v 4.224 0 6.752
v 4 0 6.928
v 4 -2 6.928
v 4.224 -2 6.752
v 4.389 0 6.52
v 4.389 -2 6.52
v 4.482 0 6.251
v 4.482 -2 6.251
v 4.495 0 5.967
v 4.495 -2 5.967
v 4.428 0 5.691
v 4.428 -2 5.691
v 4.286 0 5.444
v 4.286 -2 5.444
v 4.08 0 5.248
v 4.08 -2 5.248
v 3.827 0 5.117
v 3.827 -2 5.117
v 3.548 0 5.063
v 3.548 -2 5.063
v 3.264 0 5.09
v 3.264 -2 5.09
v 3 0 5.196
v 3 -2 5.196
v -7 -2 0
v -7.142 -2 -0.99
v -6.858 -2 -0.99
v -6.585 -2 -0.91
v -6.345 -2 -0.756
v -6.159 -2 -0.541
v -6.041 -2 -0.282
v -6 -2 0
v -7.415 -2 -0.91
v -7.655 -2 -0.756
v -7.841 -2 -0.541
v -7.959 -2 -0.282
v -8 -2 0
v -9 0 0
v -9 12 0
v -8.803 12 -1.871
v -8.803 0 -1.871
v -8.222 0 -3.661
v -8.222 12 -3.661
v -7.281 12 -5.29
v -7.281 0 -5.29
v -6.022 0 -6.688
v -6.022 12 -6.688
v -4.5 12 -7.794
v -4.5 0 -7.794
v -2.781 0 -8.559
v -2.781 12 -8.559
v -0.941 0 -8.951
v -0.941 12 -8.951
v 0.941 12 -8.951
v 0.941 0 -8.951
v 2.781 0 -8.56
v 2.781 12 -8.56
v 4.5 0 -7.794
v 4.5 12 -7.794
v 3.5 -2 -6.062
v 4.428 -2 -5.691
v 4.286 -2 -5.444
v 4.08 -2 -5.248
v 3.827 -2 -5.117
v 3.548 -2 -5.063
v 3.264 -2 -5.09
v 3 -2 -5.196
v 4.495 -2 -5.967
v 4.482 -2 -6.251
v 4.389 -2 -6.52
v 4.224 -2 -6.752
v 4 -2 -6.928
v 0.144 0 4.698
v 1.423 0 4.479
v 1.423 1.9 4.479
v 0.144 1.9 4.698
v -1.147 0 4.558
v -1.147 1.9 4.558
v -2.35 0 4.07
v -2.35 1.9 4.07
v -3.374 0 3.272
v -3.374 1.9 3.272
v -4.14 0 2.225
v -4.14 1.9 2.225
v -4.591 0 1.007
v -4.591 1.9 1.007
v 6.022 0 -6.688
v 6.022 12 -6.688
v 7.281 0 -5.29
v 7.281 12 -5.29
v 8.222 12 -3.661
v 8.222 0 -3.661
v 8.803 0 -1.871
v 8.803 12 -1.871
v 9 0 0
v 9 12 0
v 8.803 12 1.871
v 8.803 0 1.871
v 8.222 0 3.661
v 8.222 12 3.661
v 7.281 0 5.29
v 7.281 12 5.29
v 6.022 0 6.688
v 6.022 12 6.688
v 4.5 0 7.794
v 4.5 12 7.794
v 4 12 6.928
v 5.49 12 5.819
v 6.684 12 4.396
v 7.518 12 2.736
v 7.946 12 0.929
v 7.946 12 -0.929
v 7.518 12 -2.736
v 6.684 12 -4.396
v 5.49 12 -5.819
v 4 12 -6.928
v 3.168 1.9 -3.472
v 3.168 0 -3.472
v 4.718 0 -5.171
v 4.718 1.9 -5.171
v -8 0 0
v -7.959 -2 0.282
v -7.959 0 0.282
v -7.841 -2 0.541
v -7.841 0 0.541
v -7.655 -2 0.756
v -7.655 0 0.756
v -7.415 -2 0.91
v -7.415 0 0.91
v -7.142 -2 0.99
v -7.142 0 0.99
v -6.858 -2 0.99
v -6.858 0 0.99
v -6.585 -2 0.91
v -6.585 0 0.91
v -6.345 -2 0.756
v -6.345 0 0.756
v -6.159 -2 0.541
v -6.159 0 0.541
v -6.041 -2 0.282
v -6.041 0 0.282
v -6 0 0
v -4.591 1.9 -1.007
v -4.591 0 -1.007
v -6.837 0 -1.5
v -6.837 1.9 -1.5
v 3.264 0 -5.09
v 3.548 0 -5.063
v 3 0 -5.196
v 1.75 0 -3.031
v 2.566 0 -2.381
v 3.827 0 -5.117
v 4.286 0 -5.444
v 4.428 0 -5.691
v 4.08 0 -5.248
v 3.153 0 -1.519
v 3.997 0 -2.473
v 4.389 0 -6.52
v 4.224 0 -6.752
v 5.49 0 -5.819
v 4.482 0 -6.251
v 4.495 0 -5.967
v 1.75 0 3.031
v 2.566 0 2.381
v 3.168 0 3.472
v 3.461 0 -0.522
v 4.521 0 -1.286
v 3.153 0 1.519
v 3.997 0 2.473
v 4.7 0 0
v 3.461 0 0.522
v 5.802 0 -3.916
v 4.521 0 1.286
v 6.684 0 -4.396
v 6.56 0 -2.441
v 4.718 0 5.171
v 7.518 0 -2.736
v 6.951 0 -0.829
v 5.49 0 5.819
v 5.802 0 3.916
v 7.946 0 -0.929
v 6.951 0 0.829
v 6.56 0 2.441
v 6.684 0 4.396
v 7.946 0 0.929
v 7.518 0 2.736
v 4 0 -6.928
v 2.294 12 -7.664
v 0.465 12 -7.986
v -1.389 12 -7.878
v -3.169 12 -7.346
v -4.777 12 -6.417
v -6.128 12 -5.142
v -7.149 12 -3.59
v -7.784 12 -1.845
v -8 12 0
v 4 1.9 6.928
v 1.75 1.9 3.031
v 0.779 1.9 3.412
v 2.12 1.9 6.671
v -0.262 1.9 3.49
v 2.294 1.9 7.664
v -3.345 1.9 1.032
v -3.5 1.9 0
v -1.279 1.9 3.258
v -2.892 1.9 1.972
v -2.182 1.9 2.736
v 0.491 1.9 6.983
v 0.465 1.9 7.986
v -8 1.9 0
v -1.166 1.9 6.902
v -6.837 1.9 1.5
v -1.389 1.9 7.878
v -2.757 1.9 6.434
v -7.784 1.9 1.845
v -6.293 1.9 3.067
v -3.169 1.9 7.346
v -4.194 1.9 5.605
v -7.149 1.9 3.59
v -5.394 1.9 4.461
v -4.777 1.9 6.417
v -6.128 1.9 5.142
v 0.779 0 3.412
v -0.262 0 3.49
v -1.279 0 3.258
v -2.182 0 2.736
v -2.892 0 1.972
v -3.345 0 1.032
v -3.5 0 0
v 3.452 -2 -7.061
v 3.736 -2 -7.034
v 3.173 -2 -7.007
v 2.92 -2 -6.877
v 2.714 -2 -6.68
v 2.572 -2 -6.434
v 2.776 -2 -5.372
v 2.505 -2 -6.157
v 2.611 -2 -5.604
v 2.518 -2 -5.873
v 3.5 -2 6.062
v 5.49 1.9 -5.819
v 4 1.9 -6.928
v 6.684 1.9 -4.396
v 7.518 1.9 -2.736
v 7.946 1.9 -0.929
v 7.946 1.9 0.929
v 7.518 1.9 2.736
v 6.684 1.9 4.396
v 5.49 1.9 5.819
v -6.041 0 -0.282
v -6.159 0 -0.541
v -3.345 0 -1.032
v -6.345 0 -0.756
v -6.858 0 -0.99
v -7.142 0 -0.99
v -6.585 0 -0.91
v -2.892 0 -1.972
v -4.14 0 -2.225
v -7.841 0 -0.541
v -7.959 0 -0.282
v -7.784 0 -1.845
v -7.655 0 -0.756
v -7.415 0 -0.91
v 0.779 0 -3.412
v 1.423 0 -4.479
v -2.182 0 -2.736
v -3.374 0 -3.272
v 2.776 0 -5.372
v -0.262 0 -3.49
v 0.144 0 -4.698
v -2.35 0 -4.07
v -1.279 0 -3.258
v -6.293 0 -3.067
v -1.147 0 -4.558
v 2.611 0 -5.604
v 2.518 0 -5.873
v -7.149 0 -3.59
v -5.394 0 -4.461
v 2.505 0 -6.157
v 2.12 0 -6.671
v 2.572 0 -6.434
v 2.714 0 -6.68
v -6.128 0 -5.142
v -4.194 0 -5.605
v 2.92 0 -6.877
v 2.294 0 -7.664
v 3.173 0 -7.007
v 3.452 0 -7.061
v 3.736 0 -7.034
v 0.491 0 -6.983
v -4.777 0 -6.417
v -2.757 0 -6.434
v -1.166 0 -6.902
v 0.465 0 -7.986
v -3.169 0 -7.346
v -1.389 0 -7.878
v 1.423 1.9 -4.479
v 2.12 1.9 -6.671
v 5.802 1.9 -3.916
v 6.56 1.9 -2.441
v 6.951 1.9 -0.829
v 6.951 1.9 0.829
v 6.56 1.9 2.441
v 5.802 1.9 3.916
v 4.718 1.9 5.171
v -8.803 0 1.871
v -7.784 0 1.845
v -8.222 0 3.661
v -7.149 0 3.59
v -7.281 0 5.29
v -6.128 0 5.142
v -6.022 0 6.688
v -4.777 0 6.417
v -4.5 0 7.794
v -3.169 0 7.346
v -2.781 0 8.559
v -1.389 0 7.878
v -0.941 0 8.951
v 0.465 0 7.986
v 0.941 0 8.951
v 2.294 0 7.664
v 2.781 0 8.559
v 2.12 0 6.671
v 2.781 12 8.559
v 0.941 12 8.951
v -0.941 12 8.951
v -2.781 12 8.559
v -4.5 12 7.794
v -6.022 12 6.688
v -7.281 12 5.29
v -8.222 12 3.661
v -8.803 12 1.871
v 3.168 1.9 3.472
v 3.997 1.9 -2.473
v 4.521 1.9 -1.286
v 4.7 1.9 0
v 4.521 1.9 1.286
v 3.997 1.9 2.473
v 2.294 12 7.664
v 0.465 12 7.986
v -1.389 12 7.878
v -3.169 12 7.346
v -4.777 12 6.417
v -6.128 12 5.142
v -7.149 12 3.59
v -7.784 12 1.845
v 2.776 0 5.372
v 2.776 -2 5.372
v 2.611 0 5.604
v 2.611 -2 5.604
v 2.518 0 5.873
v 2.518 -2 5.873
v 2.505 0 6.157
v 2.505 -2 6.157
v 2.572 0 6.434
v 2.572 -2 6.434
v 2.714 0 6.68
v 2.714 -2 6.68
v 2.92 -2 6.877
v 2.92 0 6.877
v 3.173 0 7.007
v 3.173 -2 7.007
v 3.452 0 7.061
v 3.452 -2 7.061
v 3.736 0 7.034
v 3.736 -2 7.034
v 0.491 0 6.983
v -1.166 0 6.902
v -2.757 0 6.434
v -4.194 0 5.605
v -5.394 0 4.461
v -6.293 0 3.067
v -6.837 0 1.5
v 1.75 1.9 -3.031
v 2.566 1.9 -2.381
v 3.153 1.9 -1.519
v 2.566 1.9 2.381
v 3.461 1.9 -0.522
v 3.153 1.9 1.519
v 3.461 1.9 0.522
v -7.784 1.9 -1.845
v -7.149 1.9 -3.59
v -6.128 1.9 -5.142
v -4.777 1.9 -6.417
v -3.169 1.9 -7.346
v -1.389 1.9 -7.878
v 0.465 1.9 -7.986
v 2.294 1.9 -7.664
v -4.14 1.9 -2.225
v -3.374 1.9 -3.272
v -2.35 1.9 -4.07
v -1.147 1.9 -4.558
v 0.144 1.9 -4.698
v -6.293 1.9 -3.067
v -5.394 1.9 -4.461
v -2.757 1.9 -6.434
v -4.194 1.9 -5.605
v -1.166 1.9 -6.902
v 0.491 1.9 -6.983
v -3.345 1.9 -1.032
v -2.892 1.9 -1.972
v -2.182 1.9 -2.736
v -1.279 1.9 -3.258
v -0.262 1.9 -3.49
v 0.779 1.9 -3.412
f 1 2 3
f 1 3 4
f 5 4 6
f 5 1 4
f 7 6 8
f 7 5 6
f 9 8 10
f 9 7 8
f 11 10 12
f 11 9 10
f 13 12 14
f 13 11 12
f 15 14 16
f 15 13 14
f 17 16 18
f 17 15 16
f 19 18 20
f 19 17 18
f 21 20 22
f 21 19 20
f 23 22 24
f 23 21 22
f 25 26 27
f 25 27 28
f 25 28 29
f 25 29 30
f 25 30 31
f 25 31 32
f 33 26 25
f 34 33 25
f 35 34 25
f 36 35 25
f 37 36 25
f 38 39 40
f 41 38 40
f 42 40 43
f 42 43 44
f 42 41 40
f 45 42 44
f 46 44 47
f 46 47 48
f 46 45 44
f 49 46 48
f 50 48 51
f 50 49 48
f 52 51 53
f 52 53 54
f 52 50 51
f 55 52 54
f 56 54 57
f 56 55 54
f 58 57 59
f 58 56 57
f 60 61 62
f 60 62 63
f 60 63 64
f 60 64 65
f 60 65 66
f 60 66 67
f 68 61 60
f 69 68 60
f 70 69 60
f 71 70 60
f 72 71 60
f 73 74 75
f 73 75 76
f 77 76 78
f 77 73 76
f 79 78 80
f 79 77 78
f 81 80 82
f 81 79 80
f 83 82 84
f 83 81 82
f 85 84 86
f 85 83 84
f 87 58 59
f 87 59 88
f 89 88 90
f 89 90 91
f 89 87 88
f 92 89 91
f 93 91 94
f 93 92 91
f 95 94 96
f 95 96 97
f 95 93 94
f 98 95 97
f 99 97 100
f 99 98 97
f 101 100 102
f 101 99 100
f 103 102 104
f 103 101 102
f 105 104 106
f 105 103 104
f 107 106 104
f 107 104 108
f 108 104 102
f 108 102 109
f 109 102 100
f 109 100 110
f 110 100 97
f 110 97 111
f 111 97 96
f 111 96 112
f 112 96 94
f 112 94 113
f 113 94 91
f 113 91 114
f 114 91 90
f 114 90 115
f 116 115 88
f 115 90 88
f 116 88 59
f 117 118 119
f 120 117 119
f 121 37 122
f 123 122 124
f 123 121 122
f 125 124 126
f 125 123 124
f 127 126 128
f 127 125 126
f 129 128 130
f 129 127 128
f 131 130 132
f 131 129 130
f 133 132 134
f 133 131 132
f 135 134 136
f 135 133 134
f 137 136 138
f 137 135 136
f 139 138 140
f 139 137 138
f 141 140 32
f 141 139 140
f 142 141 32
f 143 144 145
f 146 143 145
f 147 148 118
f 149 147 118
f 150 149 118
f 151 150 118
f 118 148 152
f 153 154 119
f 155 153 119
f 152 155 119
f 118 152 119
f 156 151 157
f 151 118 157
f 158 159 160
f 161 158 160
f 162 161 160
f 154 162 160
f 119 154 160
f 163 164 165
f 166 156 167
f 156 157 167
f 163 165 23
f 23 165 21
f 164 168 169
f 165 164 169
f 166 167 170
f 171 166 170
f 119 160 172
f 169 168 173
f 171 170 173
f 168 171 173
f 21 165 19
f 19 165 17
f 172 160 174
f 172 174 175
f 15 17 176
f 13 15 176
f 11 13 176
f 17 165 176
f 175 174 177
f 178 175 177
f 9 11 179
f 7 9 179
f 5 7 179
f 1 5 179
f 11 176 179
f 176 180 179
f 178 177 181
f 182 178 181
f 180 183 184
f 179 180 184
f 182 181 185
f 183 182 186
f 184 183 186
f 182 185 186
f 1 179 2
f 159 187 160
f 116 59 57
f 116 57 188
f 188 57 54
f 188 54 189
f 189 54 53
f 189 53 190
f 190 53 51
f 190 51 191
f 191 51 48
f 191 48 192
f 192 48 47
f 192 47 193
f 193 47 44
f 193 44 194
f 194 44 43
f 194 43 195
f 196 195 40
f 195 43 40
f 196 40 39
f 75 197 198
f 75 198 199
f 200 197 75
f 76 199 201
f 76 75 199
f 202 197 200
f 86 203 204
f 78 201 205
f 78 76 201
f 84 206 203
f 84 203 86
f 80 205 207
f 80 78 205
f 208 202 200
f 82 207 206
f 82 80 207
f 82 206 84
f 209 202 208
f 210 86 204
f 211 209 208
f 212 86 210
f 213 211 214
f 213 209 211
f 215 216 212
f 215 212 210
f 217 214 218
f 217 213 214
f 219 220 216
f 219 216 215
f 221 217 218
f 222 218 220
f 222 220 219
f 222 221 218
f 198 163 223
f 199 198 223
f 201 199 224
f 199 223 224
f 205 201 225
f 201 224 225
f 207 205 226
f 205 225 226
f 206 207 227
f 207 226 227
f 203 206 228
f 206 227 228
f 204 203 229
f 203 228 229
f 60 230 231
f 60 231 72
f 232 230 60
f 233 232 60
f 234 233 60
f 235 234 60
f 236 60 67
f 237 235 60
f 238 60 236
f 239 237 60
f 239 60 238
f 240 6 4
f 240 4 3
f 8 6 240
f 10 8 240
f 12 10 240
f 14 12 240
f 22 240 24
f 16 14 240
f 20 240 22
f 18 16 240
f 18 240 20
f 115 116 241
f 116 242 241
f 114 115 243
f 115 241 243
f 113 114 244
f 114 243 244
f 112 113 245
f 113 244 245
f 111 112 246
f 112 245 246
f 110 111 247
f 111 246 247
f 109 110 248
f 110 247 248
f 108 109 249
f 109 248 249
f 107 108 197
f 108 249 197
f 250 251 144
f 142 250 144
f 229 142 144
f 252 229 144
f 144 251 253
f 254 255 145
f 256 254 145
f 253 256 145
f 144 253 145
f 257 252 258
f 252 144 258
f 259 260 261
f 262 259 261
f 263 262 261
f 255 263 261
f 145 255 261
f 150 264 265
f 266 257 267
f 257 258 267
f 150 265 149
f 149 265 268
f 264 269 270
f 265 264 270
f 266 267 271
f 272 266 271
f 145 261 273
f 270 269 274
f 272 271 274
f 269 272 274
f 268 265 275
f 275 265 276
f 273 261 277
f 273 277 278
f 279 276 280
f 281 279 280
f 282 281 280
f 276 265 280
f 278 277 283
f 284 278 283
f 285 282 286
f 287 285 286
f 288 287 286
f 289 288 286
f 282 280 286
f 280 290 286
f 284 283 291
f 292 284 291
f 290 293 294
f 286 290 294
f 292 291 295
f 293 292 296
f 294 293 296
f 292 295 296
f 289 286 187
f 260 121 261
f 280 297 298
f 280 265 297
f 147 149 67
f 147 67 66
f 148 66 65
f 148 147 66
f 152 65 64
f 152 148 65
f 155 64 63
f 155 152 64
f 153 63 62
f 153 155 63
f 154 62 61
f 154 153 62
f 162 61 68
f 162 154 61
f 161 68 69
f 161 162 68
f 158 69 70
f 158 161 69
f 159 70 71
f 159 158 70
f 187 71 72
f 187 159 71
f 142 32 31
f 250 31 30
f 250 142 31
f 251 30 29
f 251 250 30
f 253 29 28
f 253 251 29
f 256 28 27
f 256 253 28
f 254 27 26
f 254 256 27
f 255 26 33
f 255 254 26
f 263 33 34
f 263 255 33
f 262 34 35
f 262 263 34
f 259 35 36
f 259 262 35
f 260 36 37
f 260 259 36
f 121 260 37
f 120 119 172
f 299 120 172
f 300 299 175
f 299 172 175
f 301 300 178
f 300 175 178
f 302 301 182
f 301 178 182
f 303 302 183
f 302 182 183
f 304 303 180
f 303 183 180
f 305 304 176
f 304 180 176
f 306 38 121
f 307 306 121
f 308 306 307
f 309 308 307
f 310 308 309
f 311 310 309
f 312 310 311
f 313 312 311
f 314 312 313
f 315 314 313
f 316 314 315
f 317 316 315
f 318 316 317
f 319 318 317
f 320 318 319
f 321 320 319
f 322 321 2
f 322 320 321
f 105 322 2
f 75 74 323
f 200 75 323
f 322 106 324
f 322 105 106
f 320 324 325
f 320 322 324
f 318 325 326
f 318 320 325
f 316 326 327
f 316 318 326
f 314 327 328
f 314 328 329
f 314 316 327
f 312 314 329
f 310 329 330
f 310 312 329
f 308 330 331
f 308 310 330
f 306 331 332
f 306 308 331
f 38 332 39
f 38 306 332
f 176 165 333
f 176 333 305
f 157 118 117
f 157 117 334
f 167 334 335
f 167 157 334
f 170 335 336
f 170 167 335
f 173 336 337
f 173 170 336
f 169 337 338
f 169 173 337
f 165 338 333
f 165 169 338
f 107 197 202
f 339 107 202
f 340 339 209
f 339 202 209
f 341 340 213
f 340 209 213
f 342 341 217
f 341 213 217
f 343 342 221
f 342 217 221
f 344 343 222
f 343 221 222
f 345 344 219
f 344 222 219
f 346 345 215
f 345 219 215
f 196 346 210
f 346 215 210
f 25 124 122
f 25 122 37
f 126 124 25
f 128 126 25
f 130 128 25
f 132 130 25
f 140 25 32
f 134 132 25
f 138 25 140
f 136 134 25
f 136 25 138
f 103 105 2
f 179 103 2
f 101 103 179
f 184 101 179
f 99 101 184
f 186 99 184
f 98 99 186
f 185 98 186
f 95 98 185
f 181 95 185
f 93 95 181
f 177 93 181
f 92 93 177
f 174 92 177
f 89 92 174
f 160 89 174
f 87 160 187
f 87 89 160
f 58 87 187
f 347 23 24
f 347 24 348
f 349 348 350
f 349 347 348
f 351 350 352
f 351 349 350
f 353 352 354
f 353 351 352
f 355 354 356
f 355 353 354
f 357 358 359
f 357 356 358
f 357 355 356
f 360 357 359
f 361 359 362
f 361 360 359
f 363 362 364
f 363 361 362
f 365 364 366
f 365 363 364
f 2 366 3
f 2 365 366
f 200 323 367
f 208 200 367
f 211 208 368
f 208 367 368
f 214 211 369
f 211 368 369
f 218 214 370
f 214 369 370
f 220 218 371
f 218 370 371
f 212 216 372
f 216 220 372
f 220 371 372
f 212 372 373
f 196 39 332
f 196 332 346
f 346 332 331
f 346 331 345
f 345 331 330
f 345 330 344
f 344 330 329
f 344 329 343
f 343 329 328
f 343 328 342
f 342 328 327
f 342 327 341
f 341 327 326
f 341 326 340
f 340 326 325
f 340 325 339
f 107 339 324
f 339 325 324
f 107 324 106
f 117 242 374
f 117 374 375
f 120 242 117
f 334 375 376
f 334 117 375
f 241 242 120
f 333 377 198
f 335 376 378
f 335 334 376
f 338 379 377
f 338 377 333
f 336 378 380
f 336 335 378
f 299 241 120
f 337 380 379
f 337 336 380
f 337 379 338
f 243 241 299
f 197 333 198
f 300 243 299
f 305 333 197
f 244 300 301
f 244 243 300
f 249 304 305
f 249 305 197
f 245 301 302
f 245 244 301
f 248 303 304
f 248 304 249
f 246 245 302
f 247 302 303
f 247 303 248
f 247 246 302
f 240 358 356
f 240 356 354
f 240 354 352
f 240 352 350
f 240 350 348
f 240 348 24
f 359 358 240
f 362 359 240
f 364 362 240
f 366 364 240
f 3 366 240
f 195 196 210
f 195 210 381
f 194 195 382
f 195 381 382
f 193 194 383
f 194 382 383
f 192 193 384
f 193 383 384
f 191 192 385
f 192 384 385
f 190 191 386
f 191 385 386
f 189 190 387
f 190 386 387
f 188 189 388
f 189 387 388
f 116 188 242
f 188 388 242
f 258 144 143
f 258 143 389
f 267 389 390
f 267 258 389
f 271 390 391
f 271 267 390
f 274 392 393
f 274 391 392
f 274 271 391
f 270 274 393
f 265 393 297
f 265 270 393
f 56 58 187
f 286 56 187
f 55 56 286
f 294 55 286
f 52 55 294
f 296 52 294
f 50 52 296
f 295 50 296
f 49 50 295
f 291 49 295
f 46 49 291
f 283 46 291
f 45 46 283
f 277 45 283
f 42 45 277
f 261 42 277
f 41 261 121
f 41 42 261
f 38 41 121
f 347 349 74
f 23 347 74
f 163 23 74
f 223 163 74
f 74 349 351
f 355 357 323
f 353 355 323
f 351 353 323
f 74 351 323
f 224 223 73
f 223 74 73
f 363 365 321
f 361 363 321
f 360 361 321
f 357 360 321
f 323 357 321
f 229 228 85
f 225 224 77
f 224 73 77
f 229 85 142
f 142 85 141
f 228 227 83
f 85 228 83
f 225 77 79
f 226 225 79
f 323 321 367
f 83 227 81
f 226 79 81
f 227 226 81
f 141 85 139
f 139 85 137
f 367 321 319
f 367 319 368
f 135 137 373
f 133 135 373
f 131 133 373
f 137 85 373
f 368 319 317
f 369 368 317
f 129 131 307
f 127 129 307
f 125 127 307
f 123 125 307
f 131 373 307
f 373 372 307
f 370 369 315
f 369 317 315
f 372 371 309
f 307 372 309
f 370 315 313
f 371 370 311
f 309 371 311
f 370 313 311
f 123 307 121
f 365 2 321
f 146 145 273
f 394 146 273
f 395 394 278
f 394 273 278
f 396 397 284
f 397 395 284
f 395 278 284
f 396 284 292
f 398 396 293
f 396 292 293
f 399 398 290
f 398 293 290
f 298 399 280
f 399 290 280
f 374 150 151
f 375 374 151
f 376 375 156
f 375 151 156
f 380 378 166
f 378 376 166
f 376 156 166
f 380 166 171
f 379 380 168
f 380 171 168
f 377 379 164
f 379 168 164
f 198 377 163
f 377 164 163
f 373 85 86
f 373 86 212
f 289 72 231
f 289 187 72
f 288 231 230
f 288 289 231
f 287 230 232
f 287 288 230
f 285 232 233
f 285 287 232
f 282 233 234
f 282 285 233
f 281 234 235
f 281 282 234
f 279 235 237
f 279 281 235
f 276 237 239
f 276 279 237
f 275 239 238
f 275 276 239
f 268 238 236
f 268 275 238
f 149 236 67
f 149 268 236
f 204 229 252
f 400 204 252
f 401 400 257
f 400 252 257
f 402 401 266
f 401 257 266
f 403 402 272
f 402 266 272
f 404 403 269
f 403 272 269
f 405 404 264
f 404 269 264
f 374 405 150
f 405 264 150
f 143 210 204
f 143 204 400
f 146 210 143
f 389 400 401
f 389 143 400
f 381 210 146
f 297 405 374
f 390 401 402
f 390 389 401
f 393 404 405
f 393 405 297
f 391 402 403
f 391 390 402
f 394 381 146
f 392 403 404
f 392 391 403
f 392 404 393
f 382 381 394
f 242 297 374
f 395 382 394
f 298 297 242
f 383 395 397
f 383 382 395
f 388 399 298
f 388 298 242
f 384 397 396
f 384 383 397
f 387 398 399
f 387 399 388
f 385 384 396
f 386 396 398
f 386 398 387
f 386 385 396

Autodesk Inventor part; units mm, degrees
ref_plane "YZ Plane" through (0, 0, 0) normal (1, 0, 0) x (0, 1, 0)
ref_plane "XZ Plane" through (0, 0, 0) normal (0, 1, 0) x (-1, 0, 0)
ref_plane "XY Plane" through (0, 0, 0) normal (0, 0, 1) x (1, 0, 0)
sketch "スケッチ6" plane through (0, 0, 0) normal (0, 1, 0) x (-1, 0, 0)
  arc A0 (9, 0) -> (-4.5, 7.7942) centre (0, 0) ccw
  line L0 (0, 0) -> (-4.5, 7.7942) construction
  line L1 (0, 0) -> (9, 0) construction
  arc A1 (8, 0) -> (-4, 6.9282) centre (0, 0) ccw
  line L2 (0, 0) -> (-4, 6.9282) construction
  line L3 (0, 0) -> (8, 0) construction
  arc A2 (7, 0) -> (-3.5, 6.0622) centre (0, 0) ccw
  line L4 (0, 0) -> (-3.5, 6.0622) construction
  line L5 (0, 0) -> (7, 0) construction
  arc A3 (4.7, 0) -> (-2.35, 4.0703) centre (0, 0) ccw
  arc A4 (3.5, 0) -> (-1.75, 3.0311) centre (0, 0) ccw
  line L6 (4.5908, 1.0071) -> (6.8374, 1.5)
  arc A5 (10.9533, 0) -> (5.4767, 9.4859) centre (0, 0) ccw
  line L7 (0, 0) -> (5.4767, 9.4859) construction
  line L8 (0, 0) -> (10.9533, 0) construction
  line L9 (-1.4232, 4.4793) -> (-2.1197, 6.6714)
  line L10 (0, 0) -> (9, 0)
  line L11 (0, 0) -> (-4.5, 7.7942)
  point P0 (-4, 6.9282)
  point P1 (-1.75, 3.0311)
  dimension "d33" = 9
  dimension "d34" = 120
  dimension "d35" = 120
  dimension "d36" = 1
  dimension "d37" = 120
  dimension "d38" = 2
  dimension "d39" = 4.7
  dimension "d40" = 3.5
  dimension "d41" = 1.5
  dimension "d42" = 60
extrude "押し出し6" add sketch "スケッチ6" along normal blind 1.9 contours L10 A2 L11 A1 | L10 A3 L6 A2 | A2 L9 A3 L11 | L10 A4 L11 A3
sketch "スケッチ7" plane through (0, 0, 0) normal (0, -1, 0) x (1, 0, 0)
  arc A0 (4, 6.9282) -> (-8, 0) centre (0, 0) ccw projected
  arc A1 (4.5, 7.7942) -> (-9, 0) centre (0, 0) ccw
  arc A2 (4, 6.9282) -> (-8, 0) centre (0, 0) ccw
  line L0 (0, 0) -> (4, 6.9282) construction
  line L1 (0, 0) -> (-8, 0) construction
  line L2 (4.5, 7.7942) -> (4, 6.9282)
  line L3 (-9, 0) -> (-8, 0)
  dimension "d45" = 120
  dimension "d46" = 9
  dimension "d47" = 8
  dimension "d48" = 120
extrude "押し出し7" add sketch "スケッチ7" against normal blind 12
sketch "スケッチ8" plane through (0, 0, 0) normal (0, -1, 0) x (1, 0, 0)
  arc A0 (1.75, 3.0311) -> (-3.5, 0) centre (0, 0) ccw construction
  line L0 (-3.5, 0) -> (-8, 0) projected
  arc A1 (3.5, 6.0622) -> (-7, 0) centre (0, 0) ccw construction
  line L1 (0, 0) -> (-7, 0) construction
  arc A2 (-6, 0) -> (-8, 0) centre (-7, 0) ccw
  arc A3 (4, 6.9282) -> (3, 5.1962) centre (3.5, 6.0622) ccw
  line L2 (3.5, 6.0622) -> (3, 5.1962) construction
  line L3 (-7, 0) -> (-6, 0)
  line L4 (4, 6.9282) -> (1.75, 3.0311) projected
  line L5 (4, 6.9282) -> (3, 5.1962)
  dimension "d51" = 7
  dimension "d54" = 1
  dimension "d55" = 1
extrude "押し出し8" add sketch "スケッチ8" along normal blind 2
pattern_circular "円形状パターン1" count 3 over 360 about axis through (0, 0, 0) along (0, 1, 0)
properties part number "wheel"
